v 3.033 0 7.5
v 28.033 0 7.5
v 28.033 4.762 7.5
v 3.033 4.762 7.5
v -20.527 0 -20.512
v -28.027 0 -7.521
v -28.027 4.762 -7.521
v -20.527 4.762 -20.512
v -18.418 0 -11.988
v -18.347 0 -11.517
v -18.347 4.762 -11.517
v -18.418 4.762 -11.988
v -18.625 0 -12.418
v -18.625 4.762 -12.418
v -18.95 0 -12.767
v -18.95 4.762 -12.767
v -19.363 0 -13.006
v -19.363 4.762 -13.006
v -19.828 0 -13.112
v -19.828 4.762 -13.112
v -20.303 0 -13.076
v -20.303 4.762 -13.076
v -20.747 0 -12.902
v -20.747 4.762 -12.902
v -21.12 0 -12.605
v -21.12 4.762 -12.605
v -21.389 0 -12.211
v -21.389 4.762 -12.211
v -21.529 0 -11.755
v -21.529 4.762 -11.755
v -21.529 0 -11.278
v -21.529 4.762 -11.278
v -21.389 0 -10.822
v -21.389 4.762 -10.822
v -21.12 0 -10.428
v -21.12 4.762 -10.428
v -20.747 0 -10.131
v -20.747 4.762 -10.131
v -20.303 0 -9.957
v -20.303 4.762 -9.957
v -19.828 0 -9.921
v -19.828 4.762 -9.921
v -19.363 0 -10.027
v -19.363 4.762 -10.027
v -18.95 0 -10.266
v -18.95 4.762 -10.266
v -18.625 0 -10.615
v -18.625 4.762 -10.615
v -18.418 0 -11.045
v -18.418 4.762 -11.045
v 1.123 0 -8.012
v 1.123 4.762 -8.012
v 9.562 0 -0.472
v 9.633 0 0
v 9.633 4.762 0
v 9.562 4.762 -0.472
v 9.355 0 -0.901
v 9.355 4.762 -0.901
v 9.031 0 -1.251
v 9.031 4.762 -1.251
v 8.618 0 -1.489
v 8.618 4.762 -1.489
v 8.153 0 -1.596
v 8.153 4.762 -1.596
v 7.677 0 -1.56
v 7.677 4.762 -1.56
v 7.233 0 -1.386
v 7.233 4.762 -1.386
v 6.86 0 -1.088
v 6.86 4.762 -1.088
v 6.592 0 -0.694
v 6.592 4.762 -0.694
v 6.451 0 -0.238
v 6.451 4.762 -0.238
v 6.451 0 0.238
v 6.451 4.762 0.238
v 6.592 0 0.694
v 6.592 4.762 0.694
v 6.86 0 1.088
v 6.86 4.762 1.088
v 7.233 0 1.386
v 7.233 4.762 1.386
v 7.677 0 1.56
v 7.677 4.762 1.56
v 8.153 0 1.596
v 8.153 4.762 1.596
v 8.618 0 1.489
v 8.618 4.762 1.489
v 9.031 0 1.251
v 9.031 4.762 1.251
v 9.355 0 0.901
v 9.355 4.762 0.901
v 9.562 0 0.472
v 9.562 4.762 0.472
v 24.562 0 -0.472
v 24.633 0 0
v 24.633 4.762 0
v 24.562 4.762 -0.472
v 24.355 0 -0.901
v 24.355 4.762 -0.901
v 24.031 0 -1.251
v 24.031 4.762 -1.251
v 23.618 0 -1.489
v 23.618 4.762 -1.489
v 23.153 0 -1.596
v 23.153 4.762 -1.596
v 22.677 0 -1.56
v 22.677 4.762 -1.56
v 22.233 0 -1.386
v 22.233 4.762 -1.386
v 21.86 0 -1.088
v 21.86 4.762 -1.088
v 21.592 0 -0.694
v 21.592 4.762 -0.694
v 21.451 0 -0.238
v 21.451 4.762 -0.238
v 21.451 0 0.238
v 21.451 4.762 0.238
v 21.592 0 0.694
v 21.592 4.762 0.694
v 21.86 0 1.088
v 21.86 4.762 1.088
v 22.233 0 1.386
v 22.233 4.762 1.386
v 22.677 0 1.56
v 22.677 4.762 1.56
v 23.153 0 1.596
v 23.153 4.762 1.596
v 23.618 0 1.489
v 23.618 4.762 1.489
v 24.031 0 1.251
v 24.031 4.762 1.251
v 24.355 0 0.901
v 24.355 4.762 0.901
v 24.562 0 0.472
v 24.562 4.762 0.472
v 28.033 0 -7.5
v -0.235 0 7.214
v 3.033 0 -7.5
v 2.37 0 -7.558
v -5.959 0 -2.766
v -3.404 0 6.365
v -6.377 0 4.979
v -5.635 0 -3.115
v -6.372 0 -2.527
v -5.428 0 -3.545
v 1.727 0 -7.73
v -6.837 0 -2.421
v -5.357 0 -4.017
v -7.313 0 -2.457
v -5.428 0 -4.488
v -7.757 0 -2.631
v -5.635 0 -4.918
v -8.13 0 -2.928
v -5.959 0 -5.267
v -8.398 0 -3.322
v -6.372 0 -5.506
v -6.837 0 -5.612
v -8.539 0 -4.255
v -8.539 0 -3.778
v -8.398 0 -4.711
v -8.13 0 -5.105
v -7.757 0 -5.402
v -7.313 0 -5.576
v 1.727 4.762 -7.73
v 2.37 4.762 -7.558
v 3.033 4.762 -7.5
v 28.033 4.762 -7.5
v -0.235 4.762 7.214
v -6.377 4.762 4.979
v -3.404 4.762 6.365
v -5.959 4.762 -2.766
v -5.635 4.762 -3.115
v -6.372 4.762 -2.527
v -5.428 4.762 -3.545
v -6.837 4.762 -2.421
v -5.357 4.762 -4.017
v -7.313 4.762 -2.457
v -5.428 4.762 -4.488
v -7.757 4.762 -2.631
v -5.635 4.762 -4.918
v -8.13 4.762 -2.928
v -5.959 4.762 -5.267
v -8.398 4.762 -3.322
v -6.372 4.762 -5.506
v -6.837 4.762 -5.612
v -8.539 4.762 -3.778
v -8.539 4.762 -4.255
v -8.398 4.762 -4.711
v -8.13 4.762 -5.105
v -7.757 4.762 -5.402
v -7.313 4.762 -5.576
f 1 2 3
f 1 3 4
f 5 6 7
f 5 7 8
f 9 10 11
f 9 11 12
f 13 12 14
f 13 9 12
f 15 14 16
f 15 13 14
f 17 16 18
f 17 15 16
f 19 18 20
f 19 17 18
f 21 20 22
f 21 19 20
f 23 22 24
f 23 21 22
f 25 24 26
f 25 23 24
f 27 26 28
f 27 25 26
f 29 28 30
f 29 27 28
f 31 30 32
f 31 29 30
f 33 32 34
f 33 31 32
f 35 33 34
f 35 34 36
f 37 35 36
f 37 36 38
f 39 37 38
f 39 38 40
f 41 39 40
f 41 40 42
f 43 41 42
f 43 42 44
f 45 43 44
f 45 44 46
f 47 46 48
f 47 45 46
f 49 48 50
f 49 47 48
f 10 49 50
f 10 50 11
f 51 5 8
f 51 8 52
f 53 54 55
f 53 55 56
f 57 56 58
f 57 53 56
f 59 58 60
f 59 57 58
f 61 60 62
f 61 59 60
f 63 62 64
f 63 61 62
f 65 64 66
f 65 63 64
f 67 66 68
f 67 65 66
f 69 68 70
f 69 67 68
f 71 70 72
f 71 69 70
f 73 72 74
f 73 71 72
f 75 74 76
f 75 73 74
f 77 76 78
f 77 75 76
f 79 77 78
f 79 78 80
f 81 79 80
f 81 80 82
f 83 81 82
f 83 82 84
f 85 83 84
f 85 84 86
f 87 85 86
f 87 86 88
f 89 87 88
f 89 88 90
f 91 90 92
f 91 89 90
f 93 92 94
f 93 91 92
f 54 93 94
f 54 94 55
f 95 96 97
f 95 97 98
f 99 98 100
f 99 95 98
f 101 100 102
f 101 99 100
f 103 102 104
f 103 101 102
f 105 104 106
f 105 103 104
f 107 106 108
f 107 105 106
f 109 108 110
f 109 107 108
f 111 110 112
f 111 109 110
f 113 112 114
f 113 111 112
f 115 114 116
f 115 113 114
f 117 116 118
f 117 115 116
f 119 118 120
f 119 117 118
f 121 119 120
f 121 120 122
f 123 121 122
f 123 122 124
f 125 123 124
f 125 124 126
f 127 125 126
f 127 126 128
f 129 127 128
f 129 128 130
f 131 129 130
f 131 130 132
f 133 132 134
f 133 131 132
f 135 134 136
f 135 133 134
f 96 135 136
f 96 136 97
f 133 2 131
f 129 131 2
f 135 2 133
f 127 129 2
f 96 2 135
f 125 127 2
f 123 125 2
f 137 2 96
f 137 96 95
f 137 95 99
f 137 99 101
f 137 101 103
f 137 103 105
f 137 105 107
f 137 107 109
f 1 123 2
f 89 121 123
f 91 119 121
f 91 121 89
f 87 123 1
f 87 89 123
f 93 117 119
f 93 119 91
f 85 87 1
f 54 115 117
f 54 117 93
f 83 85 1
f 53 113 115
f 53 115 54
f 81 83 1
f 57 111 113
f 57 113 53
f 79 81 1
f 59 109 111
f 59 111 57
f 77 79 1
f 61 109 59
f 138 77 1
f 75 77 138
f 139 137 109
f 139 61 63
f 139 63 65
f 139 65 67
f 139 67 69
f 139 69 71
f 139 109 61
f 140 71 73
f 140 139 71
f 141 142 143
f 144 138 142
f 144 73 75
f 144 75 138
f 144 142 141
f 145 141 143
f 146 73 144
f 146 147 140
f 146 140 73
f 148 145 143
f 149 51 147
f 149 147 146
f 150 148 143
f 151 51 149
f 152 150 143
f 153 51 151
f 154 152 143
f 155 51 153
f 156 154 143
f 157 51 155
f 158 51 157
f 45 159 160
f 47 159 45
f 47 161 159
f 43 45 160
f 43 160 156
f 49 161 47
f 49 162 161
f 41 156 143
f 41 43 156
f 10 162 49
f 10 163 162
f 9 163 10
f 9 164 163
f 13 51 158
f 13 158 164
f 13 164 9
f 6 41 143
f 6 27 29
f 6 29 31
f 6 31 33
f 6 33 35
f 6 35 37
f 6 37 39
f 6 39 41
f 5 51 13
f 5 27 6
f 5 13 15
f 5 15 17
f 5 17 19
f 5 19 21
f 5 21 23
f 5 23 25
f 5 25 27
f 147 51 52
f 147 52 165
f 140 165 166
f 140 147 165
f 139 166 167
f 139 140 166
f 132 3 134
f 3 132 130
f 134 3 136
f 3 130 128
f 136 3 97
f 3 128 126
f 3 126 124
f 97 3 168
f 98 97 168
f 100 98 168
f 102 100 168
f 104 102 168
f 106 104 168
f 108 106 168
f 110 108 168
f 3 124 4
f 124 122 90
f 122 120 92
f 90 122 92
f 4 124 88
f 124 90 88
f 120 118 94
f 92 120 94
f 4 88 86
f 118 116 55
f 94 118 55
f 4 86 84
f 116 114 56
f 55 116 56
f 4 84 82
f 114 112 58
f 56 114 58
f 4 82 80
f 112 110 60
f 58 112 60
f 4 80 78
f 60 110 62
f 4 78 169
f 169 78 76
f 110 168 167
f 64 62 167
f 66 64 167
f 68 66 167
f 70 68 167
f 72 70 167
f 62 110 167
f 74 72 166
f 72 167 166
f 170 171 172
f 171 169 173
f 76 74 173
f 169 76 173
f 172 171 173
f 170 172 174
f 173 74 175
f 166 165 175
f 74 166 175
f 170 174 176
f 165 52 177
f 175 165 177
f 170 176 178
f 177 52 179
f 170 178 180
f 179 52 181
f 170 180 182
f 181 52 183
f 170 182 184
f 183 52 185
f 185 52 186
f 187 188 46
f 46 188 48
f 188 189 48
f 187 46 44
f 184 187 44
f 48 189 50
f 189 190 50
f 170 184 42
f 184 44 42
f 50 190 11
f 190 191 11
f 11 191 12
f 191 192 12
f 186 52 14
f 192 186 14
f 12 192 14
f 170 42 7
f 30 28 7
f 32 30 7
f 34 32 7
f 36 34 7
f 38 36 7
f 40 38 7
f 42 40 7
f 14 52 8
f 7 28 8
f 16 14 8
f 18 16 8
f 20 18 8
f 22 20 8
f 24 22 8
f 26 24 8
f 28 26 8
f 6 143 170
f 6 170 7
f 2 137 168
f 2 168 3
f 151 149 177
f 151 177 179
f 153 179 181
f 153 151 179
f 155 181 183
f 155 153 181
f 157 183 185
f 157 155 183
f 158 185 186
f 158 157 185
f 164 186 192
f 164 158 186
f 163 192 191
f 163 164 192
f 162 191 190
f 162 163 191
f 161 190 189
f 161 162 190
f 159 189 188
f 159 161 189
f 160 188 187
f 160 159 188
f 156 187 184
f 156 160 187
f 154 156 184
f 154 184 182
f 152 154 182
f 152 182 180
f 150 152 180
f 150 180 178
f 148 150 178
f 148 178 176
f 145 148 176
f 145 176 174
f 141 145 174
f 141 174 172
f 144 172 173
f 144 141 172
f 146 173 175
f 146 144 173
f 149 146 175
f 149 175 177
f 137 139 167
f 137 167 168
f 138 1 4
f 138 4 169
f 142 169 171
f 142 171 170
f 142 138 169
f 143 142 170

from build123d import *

# Parameters (mm, degrees)
SKETCH1_R           = 1.6
BOSS_EXTRUDE1_DEPTH = 4.7625


with BuildPart() as part:
    # Sketch1 → Boss-Extrude1 (new body)
    with BuildSketch(Plane(origin=(0, 0, 0), x_dir=(1, 0, 0), z_dir=(0, 1, 0))):
        with BuildLine():
            Line((28.033109467, 7.5), (28.033109467, -7.5))
            Line((28.033109467, -7.5), (3.033109467, -7.5))
            ThreePointArc((3.033109467, -7.5), (-1.837792139, -6.858733638), (-6.376749851, -4.978635795))
            Line((-6.376749851, -4.978635795), (-28.027384945, 7.521364205))
            Line((-28.027384945, 7.521364205), (-20.527384945, 20.511745262))
            Line((-20.527384945, 20.511745262), (1.123250149, 8.011745262))
            ThreePointArc((1.123250149, 8.011745262), (2.044493537, 7.630153756), (3.033109467, 7.5))
            Line((3.033109467, 7.5), (28.033109467, 7.5))
        make_face()
        with Locations((23.033109467, 0)):
            Circle(SKETCH1_R, mode=Mode.SUBTRACT)
        with Locations((8.033109467, 0)):
            Circle(SKETCH1_R, mode=Mode.SUBTRACT)
        with Locations((-19.947257926, 11.516554733)):
            Circle(SKETCH1_R, mode=Mode.SUBTRACT)
        with Locations((-6.956876869, 4.016554733)):
            Circle(SKETCH1_R, mode=Mode.SUBTRACT)
    extrude(amount=BOSS_EXTRUDE1_DEPTH)


solid = part.part
